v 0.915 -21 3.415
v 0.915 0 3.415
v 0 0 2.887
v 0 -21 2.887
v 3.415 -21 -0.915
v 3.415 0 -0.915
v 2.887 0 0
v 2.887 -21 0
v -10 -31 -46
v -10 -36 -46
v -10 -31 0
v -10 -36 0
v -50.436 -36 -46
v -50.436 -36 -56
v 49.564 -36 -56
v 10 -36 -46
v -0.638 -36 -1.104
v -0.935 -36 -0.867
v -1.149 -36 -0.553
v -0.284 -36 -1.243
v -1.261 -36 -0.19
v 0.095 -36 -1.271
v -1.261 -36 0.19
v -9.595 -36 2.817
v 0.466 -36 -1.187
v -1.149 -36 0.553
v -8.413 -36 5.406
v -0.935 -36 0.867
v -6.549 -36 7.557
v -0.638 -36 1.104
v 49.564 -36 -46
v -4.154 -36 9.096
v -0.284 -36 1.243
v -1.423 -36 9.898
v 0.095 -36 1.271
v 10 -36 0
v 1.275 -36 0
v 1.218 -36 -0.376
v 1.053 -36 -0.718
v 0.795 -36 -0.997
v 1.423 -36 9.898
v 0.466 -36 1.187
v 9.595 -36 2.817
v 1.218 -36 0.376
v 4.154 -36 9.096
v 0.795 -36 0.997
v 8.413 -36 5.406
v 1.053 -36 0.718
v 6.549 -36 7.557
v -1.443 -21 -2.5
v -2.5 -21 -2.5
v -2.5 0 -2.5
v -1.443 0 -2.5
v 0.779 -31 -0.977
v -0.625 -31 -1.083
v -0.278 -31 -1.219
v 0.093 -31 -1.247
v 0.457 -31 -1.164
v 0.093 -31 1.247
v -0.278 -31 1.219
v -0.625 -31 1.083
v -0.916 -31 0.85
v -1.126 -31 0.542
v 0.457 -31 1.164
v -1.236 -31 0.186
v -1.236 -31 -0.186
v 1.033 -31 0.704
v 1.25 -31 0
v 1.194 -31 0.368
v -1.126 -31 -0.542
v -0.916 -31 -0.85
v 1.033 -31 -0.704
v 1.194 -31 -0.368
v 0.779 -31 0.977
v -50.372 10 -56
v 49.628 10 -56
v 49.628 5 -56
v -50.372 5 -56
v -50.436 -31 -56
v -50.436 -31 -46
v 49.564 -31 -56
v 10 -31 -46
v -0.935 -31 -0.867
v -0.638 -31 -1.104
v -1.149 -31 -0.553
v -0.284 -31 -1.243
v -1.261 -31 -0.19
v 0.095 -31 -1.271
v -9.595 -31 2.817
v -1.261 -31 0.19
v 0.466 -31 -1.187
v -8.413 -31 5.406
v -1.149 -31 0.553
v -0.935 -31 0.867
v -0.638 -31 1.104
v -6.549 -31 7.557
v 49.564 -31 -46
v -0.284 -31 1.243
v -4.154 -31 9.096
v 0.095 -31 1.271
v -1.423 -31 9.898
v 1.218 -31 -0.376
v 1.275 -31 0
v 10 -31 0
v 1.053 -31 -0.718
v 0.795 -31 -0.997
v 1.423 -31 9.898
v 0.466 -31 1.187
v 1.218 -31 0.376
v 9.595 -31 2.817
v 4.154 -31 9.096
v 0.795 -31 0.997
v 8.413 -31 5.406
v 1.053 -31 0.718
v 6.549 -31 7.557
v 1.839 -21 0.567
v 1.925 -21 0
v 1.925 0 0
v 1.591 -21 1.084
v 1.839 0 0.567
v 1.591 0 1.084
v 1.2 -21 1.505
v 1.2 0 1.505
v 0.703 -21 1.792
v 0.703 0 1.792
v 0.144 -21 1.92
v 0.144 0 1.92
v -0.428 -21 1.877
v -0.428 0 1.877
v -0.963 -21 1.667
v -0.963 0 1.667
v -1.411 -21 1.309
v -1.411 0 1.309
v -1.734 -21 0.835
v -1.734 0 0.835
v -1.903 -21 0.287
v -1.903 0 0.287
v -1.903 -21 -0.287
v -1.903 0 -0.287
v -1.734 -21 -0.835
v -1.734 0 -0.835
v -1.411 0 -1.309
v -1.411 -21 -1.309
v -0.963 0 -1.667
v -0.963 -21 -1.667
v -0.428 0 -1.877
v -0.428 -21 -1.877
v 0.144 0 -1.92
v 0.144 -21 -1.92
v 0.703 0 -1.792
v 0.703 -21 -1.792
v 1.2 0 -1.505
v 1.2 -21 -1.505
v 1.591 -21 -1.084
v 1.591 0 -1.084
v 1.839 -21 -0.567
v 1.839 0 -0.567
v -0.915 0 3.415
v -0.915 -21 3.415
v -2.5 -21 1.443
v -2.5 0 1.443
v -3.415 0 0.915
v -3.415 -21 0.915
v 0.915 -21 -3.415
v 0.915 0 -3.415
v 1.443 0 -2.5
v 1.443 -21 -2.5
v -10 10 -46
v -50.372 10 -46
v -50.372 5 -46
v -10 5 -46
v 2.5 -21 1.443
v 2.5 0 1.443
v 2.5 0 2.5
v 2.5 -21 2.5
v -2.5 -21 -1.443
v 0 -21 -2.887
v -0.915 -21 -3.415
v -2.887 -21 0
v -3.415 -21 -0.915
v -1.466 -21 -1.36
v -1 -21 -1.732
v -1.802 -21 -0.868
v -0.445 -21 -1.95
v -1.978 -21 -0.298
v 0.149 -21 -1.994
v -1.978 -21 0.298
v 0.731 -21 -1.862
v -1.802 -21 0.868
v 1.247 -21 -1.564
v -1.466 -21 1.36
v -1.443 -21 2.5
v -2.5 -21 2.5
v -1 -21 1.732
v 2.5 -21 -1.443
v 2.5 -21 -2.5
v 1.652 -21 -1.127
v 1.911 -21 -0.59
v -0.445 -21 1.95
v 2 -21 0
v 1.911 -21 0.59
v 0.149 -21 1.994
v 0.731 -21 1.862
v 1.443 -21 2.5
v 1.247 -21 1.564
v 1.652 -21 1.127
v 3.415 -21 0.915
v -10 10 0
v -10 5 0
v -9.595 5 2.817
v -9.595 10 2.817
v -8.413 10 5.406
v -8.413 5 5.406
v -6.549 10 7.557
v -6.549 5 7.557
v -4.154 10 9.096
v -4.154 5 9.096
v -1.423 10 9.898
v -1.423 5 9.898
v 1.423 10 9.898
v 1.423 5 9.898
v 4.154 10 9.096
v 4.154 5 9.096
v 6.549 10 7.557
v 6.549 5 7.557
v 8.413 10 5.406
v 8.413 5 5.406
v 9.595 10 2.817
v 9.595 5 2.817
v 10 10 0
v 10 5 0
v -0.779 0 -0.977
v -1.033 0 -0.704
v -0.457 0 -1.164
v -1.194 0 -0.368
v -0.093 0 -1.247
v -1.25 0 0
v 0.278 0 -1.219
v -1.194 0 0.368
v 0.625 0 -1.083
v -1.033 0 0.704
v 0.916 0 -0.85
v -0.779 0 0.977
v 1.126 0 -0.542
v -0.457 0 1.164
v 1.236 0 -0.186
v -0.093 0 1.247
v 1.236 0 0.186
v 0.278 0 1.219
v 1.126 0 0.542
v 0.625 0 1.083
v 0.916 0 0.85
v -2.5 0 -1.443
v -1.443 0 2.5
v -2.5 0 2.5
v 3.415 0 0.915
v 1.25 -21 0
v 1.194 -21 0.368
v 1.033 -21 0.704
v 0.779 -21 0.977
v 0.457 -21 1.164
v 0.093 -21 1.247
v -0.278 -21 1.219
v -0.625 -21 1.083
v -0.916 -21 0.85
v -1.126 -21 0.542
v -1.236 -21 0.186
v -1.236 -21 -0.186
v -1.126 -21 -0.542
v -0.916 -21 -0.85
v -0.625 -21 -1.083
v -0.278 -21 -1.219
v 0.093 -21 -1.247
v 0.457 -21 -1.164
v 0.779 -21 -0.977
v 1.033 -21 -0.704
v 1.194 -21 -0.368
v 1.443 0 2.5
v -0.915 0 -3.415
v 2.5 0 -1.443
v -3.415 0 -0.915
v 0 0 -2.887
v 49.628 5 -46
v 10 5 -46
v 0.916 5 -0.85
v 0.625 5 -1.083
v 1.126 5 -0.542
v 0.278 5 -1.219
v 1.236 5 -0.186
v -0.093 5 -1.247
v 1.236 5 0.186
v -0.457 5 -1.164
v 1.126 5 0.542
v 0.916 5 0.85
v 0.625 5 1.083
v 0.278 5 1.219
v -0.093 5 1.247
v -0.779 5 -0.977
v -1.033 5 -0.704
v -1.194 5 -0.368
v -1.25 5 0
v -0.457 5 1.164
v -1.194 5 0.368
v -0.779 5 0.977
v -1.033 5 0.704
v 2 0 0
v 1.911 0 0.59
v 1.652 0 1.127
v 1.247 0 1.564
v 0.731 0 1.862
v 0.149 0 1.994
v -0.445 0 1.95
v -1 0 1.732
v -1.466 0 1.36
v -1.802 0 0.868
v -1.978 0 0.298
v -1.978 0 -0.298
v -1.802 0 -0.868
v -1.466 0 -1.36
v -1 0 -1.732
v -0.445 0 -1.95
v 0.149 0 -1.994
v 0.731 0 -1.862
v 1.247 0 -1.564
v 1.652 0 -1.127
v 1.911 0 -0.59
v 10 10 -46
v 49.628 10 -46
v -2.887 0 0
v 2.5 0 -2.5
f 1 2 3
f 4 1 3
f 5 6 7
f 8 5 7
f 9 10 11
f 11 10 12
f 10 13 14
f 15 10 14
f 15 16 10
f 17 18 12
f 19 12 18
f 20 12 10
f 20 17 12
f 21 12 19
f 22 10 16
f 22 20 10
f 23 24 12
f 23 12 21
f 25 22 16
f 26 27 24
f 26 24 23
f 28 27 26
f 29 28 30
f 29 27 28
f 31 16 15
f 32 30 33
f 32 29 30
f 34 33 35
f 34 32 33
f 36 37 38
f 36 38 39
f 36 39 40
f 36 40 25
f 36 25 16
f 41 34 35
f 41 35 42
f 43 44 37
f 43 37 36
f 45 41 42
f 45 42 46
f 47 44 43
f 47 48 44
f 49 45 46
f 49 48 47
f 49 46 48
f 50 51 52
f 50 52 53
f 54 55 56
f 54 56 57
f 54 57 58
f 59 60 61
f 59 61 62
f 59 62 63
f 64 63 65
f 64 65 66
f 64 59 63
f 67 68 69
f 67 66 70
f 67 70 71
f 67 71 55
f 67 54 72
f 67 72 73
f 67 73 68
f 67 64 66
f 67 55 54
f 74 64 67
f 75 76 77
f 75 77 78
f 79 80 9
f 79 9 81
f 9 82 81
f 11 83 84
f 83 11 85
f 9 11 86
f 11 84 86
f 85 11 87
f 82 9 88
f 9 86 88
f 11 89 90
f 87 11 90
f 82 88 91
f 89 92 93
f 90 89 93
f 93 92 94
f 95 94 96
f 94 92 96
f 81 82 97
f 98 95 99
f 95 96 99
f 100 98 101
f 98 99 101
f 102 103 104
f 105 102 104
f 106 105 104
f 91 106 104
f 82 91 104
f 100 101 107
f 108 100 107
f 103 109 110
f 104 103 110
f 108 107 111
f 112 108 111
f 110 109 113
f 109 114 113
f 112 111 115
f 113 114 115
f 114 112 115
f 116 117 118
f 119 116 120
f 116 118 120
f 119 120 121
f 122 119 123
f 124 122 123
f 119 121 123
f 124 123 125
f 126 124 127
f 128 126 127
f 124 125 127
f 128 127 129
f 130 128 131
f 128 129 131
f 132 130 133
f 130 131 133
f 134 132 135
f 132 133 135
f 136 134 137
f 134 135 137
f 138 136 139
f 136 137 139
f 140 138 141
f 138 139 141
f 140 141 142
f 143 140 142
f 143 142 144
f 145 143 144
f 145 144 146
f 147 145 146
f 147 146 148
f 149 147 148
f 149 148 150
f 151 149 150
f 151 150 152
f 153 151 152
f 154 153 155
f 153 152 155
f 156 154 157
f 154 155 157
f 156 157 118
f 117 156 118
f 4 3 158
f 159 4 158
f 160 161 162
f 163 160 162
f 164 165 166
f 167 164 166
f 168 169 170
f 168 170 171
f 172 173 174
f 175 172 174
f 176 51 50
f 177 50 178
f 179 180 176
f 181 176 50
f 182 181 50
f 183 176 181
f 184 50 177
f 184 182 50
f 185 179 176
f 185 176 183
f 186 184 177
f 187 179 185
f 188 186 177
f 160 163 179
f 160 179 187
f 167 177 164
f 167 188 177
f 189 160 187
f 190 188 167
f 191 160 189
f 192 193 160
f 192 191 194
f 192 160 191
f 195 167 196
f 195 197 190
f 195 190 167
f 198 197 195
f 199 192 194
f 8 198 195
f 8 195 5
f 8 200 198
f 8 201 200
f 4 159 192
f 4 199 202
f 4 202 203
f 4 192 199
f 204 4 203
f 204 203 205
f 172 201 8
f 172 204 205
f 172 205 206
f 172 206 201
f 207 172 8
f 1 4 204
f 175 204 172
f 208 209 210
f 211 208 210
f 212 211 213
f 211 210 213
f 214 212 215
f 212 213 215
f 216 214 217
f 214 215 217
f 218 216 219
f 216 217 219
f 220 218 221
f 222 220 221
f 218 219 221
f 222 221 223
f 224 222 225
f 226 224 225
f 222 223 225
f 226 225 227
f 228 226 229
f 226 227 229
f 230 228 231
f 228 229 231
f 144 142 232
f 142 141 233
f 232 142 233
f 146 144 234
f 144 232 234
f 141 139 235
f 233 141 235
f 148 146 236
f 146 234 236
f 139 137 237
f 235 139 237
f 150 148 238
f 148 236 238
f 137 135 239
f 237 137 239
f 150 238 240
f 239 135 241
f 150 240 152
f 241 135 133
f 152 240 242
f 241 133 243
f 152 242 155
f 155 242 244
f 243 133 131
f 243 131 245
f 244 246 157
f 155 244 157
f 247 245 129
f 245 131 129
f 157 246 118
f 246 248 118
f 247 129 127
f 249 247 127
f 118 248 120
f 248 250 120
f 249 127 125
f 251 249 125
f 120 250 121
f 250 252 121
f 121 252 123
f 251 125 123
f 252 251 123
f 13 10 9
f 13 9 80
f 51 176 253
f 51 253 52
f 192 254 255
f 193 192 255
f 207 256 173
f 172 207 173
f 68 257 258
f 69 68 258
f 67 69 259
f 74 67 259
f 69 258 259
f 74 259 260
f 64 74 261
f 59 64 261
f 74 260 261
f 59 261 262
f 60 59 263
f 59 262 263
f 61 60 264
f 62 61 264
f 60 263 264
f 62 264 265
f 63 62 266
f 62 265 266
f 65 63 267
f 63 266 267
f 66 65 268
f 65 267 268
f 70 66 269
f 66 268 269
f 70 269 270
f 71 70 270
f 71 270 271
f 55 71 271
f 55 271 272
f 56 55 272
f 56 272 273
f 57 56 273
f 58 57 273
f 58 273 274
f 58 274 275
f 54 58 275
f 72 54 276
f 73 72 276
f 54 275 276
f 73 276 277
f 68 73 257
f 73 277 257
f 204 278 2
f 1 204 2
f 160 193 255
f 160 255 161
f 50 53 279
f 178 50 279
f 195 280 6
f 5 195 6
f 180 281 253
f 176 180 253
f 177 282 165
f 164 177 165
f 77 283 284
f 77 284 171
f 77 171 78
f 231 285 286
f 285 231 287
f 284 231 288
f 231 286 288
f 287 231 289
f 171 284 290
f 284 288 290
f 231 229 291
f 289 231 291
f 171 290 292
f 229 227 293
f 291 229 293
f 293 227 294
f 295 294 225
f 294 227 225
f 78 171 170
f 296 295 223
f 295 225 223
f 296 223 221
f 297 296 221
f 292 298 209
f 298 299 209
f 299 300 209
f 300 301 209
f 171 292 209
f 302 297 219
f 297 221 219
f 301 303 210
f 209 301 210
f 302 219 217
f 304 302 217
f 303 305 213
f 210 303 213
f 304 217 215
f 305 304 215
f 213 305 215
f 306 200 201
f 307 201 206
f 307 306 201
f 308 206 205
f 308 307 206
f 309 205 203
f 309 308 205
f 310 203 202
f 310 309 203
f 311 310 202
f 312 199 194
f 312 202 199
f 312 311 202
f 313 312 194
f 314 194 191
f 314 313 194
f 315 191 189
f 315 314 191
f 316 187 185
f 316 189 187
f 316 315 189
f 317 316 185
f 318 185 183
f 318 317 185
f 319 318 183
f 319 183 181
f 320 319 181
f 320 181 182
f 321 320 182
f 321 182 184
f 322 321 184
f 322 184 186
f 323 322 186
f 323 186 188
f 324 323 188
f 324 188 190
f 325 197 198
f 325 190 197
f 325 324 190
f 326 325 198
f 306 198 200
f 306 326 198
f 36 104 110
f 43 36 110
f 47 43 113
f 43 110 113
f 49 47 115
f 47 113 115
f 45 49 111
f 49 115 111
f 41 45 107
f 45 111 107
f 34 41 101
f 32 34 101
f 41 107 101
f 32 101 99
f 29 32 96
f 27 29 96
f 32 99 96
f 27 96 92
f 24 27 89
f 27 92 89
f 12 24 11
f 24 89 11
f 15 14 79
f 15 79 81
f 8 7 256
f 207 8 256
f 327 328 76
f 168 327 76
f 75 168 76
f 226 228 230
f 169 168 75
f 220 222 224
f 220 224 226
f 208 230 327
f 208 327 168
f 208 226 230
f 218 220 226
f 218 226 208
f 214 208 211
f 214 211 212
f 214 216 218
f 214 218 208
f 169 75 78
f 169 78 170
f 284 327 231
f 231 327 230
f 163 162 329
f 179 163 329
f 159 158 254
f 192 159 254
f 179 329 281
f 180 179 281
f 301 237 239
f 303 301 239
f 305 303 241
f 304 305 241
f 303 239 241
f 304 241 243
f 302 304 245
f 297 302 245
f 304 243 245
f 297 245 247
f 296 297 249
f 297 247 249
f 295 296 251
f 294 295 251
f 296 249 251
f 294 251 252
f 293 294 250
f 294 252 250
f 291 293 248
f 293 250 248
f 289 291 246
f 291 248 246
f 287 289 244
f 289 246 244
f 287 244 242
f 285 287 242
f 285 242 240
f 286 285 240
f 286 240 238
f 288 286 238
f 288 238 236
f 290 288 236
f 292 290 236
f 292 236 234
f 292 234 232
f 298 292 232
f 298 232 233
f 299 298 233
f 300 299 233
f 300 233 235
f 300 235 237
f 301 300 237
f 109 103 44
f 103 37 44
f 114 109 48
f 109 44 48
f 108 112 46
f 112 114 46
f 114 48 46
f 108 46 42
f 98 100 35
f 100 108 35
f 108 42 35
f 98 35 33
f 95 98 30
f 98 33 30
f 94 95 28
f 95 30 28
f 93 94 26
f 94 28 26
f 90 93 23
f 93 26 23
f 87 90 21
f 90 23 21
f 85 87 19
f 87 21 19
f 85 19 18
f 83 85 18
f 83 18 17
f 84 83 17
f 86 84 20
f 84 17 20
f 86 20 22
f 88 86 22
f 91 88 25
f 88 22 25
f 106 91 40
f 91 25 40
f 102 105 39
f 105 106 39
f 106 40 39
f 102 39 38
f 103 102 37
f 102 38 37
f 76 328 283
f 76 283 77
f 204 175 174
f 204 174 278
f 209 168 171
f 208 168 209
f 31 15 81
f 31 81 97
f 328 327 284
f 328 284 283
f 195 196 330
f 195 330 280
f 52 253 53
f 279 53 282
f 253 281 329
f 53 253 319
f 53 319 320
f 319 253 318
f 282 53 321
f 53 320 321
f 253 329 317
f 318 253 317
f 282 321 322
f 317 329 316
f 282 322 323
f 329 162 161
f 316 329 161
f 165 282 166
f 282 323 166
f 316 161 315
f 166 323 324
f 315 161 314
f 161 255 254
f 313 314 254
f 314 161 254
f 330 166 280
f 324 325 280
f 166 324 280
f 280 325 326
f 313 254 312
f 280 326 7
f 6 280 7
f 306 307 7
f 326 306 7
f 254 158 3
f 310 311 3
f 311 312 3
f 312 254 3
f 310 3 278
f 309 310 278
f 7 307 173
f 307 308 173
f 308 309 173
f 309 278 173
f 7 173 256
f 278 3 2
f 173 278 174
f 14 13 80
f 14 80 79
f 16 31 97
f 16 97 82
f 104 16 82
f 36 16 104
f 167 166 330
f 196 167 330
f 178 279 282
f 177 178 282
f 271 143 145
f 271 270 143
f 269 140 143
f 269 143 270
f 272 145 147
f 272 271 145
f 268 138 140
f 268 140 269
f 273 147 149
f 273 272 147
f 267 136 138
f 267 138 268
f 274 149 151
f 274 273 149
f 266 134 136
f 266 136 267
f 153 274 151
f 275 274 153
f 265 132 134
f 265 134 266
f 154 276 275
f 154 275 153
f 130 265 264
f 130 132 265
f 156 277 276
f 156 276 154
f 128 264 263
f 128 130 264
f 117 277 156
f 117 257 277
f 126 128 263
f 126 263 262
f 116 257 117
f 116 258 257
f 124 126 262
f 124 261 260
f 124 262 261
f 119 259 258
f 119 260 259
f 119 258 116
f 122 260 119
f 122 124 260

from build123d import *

# Parameters (mm, degrees)
F1_DEPTH  = 21
F2_R      = 2
F3_DEPTH  = 21.001
F4_R      = 1.925
F5_DEPTH  = 21
F6_R      = 1.25
F7_DEPTH  = 10
F8_R      = 1.25
F9_DEPTH  = 5
F10_R     = 10
F11_DEPTH = 5
F12_R     = 10
F13_DEPTH = 5
F14_R     = 1.275
F15_DEPTH = 5
F17_W     = 10
F17_H     = 56
F18_DEPTH = 5
F19_R     = 1.275
F20_DEPTH = 5
F22_W     = 10
F22_H     = 56
F23_DEPTH = 5
F25_DEPTH = 5
F27_DEPTH = 5


with BuildPart() as f1:
    # F0 (on Front) → F1 (new body)
    with BuildSketch(Plane.XZ):
        Polygon((0, -2.5), (0, 0), (-1.25, -2.1650635095), (-0.6698729811, -2.5), align=None)
        Polygon((1.25, -2.1650635095), (0, 0), (0, -2.5), (0.6698729811, -2.5), align=None)
        Polygon((2.1650635095, -1.25), (0, 0), (1.25, -2.1650635095), (1.8301270189, -1.8301270189), align=None)
        Polygon((2.5, -0.6698729811), (2.5, 0), (0, 0), (2.1650635095, -1.25), align=None)
        Polygon((0, 0), (2.5, 0), (2.5, 0.6698729811), (2.1650635095, 1.25), align=None)
        Polygon((1.25, 2.1650635095), (0, 0), (2.1650635095, 1.25), (1.8301270189, 1.8301270189), align=None)
        Polygon((0, 2.5), (0, 0), (1.25, 2.1650635095), (0.6698729811, 2.5), align=None)
        Polygon((-1.25, 2.1650635095), (0, 0), (0, 2.5), (-0.6698729811, 2.5), align=None)
        Polygon((-2.5, 0), (0, 0), (-2.1650635095, 1.25), (-2.5, 0.6698729811), align=None)
        Polygon((-2.1650635095, 1.25), (0, 0), (-1.25, 2.1650635095), (-1.8301270189, 1.8301270189), align=None)
        Polygon((-2.1650635095, -1.25), (0, 0), (-2.5, 0), (-2.5, -0.6698729811), align=None)
        Polygon((-1.25, -2.1650635095), (0, 0), (-2.1650635095, -1.25), (-1.8301270189, -1.8301270189), align=None)
        Polygon((-2.5, -0.6698729811), (-2.8867513459, 0), (-3.4150635095, -0.9150635095), (-2.5, -1.443375673), align=None)
        Polygon((-2.5, -1.443375673), (-2.1650635095, -1.25), (-2.5, -0.6698729811), align=None)
        Polygon((-1.8301270189, -1.8301270189), (-2.1650635095, -1.25), (-2.5, -1.443375673), align=None)
        Polygon((-2.5, -0.6698729811), (-2.5, 0), (-2.8867513459, 0), align=None)
        Polygon((-2.8867513459, 0), (-2.5, 0), (-2.5, 0.6698729811), align=None)
        Polygon((-2.5, 0.6698729811), (-2.5, 1.443375673), (-3.4150635095, 0.9150635095), (-2.8867513459, 0), align=None)
        Polygon((-2.5, 0.6698729811), (-2.1650635095, 1.25), (-2.5, 1.443375673), align=None)
        Polygon((-2.5, 1.443375673), (-2.1650635095, 1.25), (-1.8301270189, 1.8301270189), align=None)
        Polygon((-1.8301270189, 1.8301270189), (-1.25, 2.1650635095), (-1.443375673, 2.5), align=None)
        Polygon((-1.443375673, 2.5), (-1.25, 2.1650635095), (-0.6698729811, 2.5), align=None)
        Polygon((-1.8301270189, 1.8301270189), (-1.443375673, 2.5), (-2.5, 2.5), (-2.5, 1.443375673), align=None)
        Polygon((-0.6698729811, 2.5), (0, 2.8867513459), (-0.9150635095, 3.4150635095), (-1.443375673, 2.5), align=None)
        Polygon((-0.6698729811, 2.5), (0, 2.5), (0, 2.8867513459), align=None)
        Polygon((0, 2.8867513459), (0, 2.5), (0.6698729811, 2.5), align=None)
        Polygon((0.6698729811, 2.5), (1.443375673, 2.5), (0.9150635095, 3.4150635095), (0, 2.8867513459), align=None)
        Polygon((1.25, 2.1650635095), (1.8301270189, 1.8301270189), (1.443375673, 2.5), align=None)
        Polygon((1.25, 2.1650635095), (1.443375673, 2.5), (0.6698729811, 2.5), align=None)
        Polygon((2.1650635095, 1.25), (2.5, 1.443375673), (1.8301270189, 1.8301270189), align=None)
        Polygon((2.1650635095, 1.25), (2.5, 0.6698729811), (2.5, 1.443375673), align=None)
        Polygon((1.8301270189, 1.8301270189), (2.5, 1.443375673), (2.5, 2.5), (1.443375673, 2.5), align=None)
        Polygon((2.5, 0.6698729811), (2.8867513459, 0), (3.4150635095, 0.9150635095), (2.5, 1.443375673), align=None)
        Polygon((2.5, -0.6698729811), (2.8867513459, 0), (2.5, 0), align=None)
        Polygon((2.5, 0), (2.8867513459, 0), (2.5, 0.6698729811), align=None)
        Polygon((3.4150635095, -0.9150635095), (2.8867513459, 0), (2.5, -0.6698729811), (2.5, -1.443375673), align=None)
        Polygon((2.5, -1.443375673), (2.5, -0.6698729811), (2.1650635095, -1.25), align=None)
        Polygon((1.8301270189, -1.8301270189), (2.5, -1.443375673), (2.1650635095, -1.25), align=None)
        Polygon((2.5, -2.5), (2.5, -1.443375673), (1.8301270189, -1.8301270189), (1.443375673, -2.5), align=None)
        Polygon((1.443375673, -2.5), (1.8301270189, -1.8301270189), (1.25, -2.1650635095), align=None)
        Polygon((0.6698729811, -2.5), (1.443375673, -2.5), (1.25, -2.1650635095), align=None)
        Polygon((0.9150635095, -3.4150635095), (1.443375673, -2.5), (0.6698729811, -2.5), (0, -2.8867513459), align=None)
        Polygon((0.6698729811, -2.5), (0, -2.5), (0, -2.8867513459), align=None)
        Polygon((0, -2.8867513459), (0, -2.5), (-0.6698729811, -2.5), align=None)
        Polygon((-0.9150635095, -3.4150635095), (0, -2.8867513459), (-0.6698729811, -2.5), (-1.443375673, -2.5), align=None)
        Polygon((-0.6698729811, -2.5), (-1.25, -2.1650635095), (-1.443375673, -2.5), align=None)
        Polygon((-1.443375673, -2.5), (-1.25, -2.1650635095), (-1.8301270189, -1.8301270189), align=None)
        Polygon((-1.8301270189, -1.8301270189), (-2.5, -1.443375673), (-2.5, -2.5), (-1.443375673, -2.5), align=None)
    extrude(amount=F1_DEPTH)

    # F2 (on Front) → F3 (cut, through all)
    with BuildSketch(Plane.XZ):
        Circle(F2_R)
    extrude(amount=F3_DEPTH, mode=Mode.SUBTRACT)


with BuildPart() as f5:
    # F4 (on Front) → F5 (new body)
    with BuildSketch(Plane.XZ):
        Circle(F4_R)
    extrude(amount=F5_DEPTH)

    # F6 (on face) → F7 (join)
    with BuildSketch(Plane.XZ.offset(21)):
        Circle(F6_R)
    extrude(amount=F7_DEPTH)

    # F8 (on face) → F9 (join)
    with BuildSketch(Plane(origin=(0, 0, 0), x_dir=(-1, 0, 0), z_dir=(0, 1, 0))):
        Circle(F8_R)
    extrude(amount=F9_DEPTH)

    # F10 (on face) → F11 (join)
    with BuildSketch(Plane(origin=(0, 5, 0), x_dir=(-1, 0, 0), z_dir=(0, 1, 0))):
        Circle(F10_R)
    extrude(amount=F11_DEPTH)

    # F12 (on face) → F13 (join)
    with BuildSketch(Plane.XZ.offset(31)):
        Circle(F12_R)
    extrude(amount=F13_DEPTH)

    # F14 (on face) → F15 (cut)
    with BuildSketch(Plane.XZ.offset(36)):
        Circle(F14_R)
    extrude(amount=-F15_DEPTH, mode=Mode.SUBTRACT)


with BuildPart() as f18:
    # F17 (on face) → F18 (new body)
    with BuildSketch(Plane.XZ.offset(36)):
        with Locations((5, -28)):
            Rectangle(F17_W, F17_H)
        with Locations((-5, -28)):
            Rectangle(F17_W, F17_H)
    extrude(amount=-F18_DEPTH)

    # F19 (on face) → F20 (cut)
    with BuildSketch(Plane.XZ.offset(36)):
        Circle(F19_R)
    extrude(amount=-F20_DEPTH, mode=Mode.SUBTRACT)

    # F21: union F5
    add(f5.part)

    # F22 (on face) → F23 (join)
    with BuildSketch(Plane(origin=(0, 10, 0), x_dir=(-1, 0, 0), z_dir=(0, 1, 0))):
        with Locations((5, -28)):
            Rectangle(F22_W, F22_H)
        with Locations((-5, -28)):
            Rectangle(F22_W, F22_H)
    extrude(amount=-F23_DEPTH)

    # F24 (on face) → F25 (join)
    with BuildSketch(Plane.XZ.offset(36)):
        Polygon((-50.4363812506, -56), (0, -56), (49.5636187494, -56), (49.5636187494, -46), (-50.4363812506, -46), align=None)
    extrude(amount=-F25_DEPTH)

    # F26 (on face) → F27 (join)
    with BuildSketch(Plane(origin=(0, 10, 0), x_dir=(-1, 0, 0), z_dir=(0, 1, 0))):
        Polygon((-49.6278107166, -56), (0, -56), (50.3721892834, -56), (50.3721892834, -46), (-49.6278107166, -46), align=None)
    extrude(amount=-F27_DEPTH)


solid = Compound([f1.part, f18.part])
